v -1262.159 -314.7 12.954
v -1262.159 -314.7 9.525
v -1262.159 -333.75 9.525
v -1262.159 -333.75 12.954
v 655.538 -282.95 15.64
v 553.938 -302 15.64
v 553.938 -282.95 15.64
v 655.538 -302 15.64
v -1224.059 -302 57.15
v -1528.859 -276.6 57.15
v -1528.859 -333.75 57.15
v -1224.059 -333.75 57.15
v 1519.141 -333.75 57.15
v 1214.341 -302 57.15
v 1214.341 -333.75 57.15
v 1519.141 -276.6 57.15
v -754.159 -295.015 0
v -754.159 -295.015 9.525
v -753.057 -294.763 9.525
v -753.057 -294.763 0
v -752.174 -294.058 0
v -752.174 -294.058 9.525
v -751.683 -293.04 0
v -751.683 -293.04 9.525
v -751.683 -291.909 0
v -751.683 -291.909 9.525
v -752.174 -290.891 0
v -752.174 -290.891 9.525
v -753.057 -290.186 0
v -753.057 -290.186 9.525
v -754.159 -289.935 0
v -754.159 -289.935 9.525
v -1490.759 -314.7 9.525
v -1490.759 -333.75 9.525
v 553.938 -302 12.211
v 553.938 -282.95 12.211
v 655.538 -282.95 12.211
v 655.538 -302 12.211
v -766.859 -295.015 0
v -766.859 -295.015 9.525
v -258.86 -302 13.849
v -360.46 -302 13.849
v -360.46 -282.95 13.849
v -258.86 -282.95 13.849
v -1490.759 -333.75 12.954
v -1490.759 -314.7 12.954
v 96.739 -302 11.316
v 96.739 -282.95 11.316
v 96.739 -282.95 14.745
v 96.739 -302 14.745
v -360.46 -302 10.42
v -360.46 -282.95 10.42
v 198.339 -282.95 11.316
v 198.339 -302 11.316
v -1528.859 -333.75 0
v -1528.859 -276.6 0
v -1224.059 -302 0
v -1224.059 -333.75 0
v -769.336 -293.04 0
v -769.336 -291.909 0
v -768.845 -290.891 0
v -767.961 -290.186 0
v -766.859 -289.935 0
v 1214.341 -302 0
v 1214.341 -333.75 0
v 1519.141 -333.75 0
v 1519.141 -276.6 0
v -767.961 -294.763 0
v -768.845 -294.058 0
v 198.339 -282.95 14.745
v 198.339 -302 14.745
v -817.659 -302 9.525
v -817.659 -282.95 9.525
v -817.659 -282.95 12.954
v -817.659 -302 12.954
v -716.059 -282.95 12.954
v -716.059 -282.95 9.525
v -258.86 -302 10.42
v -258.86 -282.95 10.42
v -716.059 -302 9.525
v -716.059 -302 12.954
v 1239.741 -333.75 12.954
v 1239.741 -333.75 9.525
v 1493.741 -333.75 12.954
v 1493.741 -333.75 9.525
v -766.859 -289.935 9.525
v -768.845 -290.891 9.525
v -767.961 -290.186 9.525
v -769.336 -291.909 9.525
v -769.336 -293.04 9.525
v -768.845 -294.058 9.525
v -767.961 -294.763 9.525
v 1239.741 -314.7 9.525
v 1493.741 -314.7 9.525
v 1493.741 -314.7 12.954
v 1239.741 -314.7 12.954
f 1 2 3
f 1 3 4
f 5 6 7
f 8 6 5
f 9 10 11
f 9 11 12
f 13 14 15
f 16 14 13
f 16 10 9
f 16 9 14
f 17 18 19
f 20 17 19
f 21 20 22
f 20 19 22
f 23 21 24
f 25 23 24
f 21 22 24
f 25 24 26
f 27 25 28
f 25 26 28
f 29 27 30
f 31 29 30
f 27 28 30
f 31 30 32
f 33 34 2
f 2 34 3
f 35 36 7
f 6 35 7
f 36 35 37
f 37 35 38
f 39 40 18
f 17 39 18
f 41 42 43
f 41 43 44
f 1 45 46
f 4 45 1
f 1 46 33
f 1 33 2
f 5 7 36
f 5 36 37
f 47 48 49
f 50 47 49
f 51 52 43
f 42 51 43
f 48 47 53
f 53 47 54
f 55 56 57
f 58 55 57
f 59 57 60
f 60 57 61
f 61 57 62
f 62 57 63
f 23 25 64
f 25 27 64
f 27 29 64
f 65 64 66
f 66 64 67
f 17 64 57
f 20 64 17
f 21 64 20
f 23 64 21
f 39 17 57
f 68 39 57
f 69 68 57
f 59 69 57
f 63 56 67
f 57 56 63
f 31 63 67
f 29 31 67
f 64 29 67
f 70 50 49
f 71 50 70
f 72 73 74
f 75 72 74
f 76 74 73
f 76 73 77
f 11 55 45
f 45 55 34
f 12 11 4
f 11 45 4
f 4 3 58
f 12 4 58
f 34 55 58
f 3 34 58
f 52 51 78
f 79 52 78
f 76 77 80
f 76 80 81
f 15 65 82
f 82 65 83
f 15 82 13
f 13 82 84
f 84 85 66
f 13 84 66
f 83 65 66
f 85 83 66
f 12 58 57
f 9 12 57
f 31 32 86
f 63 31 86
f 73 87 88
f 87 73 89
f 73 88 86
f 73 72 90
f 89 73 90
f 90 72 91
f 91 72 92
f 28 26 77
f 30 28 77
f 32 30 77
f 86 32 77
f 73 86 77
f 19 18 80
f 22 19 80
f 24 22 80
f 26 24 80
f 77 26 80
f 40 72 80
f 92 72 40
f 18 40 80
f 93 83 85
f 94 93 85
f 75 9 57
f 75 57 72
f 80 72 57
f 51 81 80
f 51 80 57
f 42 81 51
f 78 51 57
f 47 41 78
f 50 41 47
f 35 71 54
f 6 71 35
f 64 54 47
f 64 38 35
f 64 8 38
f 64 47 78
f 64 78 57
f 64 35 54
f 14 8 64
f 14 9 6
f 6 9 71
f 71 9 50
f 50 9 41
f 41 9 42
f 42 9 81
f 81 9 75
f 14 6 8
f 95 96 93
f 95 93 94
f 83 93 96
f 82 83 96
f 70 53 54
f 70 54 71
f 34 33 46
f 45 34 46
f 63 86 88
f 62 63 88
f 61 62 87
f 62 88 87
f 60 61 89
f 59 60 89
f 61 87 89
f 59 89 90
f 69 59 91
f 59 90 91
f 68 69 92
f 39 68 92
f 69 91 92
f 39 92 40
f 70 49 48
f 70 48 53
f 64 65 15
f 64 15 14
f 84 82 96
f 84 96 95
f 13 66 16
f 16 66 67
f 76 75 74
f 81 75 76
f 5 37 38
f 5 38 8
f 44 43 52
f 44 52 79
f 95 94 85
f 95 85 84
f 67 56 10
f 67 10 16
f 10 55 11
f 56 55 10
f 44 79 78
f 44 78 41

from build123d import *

# Parameters (mm, degrees)
F0_W      = 3048
F0_H      = 57.15
F2_DEPTH  = 57.15
F3_W      = 2438.4
F3_H      = 31.75
F4_DEPTH  = 57.15
F5_W      = 228.6
F5_H      = 3.429
F6_DEPTH  = 19.05
F7_W      = 254
F7_H      = 3.429
F8_DEPTH  = 19.05
F9_W      = 101.6
F9_H      = 3.429
F10_DEPTH = 19.05
F12_DEPTH = 9.525


# Not quite as in the source:
# - a variable given as a bare number and used for a length is read in inches; the dataset says mm whatever the document's units were


with BuildPart() as f2:
    # F0 (on Top) → F2 (new body)
    with BuildSketch(Plane.XY):
        with Locations((-4.8593655229, -305.1746997266)):
            Rectangle(F0_W, F0_H)
    extrude(amount=F2_DEPTH)

    # F3 (on face) → F4 (cut, through all)
    with BuildSketch(Plane.XY.offset(57.15)):
        with Locations((-4.8593655229, -317.8746997266)):
            Rectangle(F3_W, F3_H)
    extrude(amount=-F4_DEPTH, mode=Mode.SUBTRACT)

    # F5 (on face) → F6 (cut)
    with BuildSketch(Plane.XZ.offset(333.7496997266)):
        with Locations((-1376.4593655229, 11.2395)):
            Rectangle(F5_W, F5_H)
    extrude(amount=-F6_DEPTH, mode=Mode.SUBTRACT)

    # F7 (on face) → F8 (cut)
    with BuildSketch(Plane.XZ.offset(333.7496997266)):
        with Locations((1366.7406344771, 11.2395)):
            Rectangle(F7_W, F7_H)
    extrude(amount=-F8_DEPTH, mode=Mode.SUBTRACT)

    # F9 (on face) → F10 (cut)
    with BuildSketch(Plane.XZ.offset(301.9996997266)):
        with Locations((-766.8593655229, 11.2395)):
            Rectangle(F9_W, F9_H)
        with Locations((-309.6602423327, 12.1349072401)):
            Rectangle(F9_W, F9_H)
        with Locations((147.5388808575, 13.0303144803)):
            Rectangle(F9_W, F9_H)
        with Locations((604.7380040477, 13.9257217204)):
            Rectangle(F9_W, F9_H)
    extrude(amount=-F10_DEPTH, mode=Mode.SUBTRACT)

    # F11 (on face) → F12 (cut, through all)
    with BuildSketch(Plane.XY.offset(9.525)):
        with BuildLine():
            Line((-754.1593655229, -289.9346997266), (-766.8593655229, -289.9346997266))
            ThreePointArc((-766.8593655229, -289.9346997266), (-769.3993655229, -292.4746997266), (-766.8593655229, -295.0146997266))
            Line((-766.8593655229, -295.0146997266), (-754.1593655229, -295.0146997266))
            ThreePointArc((-754.1593655229, -295.0146997266), (-751.6193655229, -292.4746997266), (-754.1593655229, -289.9346997266))
        make_face()
    extrude(amount=-F12_DEPTH, mode=Mode.SUBTRACT)


solid = f2.part
